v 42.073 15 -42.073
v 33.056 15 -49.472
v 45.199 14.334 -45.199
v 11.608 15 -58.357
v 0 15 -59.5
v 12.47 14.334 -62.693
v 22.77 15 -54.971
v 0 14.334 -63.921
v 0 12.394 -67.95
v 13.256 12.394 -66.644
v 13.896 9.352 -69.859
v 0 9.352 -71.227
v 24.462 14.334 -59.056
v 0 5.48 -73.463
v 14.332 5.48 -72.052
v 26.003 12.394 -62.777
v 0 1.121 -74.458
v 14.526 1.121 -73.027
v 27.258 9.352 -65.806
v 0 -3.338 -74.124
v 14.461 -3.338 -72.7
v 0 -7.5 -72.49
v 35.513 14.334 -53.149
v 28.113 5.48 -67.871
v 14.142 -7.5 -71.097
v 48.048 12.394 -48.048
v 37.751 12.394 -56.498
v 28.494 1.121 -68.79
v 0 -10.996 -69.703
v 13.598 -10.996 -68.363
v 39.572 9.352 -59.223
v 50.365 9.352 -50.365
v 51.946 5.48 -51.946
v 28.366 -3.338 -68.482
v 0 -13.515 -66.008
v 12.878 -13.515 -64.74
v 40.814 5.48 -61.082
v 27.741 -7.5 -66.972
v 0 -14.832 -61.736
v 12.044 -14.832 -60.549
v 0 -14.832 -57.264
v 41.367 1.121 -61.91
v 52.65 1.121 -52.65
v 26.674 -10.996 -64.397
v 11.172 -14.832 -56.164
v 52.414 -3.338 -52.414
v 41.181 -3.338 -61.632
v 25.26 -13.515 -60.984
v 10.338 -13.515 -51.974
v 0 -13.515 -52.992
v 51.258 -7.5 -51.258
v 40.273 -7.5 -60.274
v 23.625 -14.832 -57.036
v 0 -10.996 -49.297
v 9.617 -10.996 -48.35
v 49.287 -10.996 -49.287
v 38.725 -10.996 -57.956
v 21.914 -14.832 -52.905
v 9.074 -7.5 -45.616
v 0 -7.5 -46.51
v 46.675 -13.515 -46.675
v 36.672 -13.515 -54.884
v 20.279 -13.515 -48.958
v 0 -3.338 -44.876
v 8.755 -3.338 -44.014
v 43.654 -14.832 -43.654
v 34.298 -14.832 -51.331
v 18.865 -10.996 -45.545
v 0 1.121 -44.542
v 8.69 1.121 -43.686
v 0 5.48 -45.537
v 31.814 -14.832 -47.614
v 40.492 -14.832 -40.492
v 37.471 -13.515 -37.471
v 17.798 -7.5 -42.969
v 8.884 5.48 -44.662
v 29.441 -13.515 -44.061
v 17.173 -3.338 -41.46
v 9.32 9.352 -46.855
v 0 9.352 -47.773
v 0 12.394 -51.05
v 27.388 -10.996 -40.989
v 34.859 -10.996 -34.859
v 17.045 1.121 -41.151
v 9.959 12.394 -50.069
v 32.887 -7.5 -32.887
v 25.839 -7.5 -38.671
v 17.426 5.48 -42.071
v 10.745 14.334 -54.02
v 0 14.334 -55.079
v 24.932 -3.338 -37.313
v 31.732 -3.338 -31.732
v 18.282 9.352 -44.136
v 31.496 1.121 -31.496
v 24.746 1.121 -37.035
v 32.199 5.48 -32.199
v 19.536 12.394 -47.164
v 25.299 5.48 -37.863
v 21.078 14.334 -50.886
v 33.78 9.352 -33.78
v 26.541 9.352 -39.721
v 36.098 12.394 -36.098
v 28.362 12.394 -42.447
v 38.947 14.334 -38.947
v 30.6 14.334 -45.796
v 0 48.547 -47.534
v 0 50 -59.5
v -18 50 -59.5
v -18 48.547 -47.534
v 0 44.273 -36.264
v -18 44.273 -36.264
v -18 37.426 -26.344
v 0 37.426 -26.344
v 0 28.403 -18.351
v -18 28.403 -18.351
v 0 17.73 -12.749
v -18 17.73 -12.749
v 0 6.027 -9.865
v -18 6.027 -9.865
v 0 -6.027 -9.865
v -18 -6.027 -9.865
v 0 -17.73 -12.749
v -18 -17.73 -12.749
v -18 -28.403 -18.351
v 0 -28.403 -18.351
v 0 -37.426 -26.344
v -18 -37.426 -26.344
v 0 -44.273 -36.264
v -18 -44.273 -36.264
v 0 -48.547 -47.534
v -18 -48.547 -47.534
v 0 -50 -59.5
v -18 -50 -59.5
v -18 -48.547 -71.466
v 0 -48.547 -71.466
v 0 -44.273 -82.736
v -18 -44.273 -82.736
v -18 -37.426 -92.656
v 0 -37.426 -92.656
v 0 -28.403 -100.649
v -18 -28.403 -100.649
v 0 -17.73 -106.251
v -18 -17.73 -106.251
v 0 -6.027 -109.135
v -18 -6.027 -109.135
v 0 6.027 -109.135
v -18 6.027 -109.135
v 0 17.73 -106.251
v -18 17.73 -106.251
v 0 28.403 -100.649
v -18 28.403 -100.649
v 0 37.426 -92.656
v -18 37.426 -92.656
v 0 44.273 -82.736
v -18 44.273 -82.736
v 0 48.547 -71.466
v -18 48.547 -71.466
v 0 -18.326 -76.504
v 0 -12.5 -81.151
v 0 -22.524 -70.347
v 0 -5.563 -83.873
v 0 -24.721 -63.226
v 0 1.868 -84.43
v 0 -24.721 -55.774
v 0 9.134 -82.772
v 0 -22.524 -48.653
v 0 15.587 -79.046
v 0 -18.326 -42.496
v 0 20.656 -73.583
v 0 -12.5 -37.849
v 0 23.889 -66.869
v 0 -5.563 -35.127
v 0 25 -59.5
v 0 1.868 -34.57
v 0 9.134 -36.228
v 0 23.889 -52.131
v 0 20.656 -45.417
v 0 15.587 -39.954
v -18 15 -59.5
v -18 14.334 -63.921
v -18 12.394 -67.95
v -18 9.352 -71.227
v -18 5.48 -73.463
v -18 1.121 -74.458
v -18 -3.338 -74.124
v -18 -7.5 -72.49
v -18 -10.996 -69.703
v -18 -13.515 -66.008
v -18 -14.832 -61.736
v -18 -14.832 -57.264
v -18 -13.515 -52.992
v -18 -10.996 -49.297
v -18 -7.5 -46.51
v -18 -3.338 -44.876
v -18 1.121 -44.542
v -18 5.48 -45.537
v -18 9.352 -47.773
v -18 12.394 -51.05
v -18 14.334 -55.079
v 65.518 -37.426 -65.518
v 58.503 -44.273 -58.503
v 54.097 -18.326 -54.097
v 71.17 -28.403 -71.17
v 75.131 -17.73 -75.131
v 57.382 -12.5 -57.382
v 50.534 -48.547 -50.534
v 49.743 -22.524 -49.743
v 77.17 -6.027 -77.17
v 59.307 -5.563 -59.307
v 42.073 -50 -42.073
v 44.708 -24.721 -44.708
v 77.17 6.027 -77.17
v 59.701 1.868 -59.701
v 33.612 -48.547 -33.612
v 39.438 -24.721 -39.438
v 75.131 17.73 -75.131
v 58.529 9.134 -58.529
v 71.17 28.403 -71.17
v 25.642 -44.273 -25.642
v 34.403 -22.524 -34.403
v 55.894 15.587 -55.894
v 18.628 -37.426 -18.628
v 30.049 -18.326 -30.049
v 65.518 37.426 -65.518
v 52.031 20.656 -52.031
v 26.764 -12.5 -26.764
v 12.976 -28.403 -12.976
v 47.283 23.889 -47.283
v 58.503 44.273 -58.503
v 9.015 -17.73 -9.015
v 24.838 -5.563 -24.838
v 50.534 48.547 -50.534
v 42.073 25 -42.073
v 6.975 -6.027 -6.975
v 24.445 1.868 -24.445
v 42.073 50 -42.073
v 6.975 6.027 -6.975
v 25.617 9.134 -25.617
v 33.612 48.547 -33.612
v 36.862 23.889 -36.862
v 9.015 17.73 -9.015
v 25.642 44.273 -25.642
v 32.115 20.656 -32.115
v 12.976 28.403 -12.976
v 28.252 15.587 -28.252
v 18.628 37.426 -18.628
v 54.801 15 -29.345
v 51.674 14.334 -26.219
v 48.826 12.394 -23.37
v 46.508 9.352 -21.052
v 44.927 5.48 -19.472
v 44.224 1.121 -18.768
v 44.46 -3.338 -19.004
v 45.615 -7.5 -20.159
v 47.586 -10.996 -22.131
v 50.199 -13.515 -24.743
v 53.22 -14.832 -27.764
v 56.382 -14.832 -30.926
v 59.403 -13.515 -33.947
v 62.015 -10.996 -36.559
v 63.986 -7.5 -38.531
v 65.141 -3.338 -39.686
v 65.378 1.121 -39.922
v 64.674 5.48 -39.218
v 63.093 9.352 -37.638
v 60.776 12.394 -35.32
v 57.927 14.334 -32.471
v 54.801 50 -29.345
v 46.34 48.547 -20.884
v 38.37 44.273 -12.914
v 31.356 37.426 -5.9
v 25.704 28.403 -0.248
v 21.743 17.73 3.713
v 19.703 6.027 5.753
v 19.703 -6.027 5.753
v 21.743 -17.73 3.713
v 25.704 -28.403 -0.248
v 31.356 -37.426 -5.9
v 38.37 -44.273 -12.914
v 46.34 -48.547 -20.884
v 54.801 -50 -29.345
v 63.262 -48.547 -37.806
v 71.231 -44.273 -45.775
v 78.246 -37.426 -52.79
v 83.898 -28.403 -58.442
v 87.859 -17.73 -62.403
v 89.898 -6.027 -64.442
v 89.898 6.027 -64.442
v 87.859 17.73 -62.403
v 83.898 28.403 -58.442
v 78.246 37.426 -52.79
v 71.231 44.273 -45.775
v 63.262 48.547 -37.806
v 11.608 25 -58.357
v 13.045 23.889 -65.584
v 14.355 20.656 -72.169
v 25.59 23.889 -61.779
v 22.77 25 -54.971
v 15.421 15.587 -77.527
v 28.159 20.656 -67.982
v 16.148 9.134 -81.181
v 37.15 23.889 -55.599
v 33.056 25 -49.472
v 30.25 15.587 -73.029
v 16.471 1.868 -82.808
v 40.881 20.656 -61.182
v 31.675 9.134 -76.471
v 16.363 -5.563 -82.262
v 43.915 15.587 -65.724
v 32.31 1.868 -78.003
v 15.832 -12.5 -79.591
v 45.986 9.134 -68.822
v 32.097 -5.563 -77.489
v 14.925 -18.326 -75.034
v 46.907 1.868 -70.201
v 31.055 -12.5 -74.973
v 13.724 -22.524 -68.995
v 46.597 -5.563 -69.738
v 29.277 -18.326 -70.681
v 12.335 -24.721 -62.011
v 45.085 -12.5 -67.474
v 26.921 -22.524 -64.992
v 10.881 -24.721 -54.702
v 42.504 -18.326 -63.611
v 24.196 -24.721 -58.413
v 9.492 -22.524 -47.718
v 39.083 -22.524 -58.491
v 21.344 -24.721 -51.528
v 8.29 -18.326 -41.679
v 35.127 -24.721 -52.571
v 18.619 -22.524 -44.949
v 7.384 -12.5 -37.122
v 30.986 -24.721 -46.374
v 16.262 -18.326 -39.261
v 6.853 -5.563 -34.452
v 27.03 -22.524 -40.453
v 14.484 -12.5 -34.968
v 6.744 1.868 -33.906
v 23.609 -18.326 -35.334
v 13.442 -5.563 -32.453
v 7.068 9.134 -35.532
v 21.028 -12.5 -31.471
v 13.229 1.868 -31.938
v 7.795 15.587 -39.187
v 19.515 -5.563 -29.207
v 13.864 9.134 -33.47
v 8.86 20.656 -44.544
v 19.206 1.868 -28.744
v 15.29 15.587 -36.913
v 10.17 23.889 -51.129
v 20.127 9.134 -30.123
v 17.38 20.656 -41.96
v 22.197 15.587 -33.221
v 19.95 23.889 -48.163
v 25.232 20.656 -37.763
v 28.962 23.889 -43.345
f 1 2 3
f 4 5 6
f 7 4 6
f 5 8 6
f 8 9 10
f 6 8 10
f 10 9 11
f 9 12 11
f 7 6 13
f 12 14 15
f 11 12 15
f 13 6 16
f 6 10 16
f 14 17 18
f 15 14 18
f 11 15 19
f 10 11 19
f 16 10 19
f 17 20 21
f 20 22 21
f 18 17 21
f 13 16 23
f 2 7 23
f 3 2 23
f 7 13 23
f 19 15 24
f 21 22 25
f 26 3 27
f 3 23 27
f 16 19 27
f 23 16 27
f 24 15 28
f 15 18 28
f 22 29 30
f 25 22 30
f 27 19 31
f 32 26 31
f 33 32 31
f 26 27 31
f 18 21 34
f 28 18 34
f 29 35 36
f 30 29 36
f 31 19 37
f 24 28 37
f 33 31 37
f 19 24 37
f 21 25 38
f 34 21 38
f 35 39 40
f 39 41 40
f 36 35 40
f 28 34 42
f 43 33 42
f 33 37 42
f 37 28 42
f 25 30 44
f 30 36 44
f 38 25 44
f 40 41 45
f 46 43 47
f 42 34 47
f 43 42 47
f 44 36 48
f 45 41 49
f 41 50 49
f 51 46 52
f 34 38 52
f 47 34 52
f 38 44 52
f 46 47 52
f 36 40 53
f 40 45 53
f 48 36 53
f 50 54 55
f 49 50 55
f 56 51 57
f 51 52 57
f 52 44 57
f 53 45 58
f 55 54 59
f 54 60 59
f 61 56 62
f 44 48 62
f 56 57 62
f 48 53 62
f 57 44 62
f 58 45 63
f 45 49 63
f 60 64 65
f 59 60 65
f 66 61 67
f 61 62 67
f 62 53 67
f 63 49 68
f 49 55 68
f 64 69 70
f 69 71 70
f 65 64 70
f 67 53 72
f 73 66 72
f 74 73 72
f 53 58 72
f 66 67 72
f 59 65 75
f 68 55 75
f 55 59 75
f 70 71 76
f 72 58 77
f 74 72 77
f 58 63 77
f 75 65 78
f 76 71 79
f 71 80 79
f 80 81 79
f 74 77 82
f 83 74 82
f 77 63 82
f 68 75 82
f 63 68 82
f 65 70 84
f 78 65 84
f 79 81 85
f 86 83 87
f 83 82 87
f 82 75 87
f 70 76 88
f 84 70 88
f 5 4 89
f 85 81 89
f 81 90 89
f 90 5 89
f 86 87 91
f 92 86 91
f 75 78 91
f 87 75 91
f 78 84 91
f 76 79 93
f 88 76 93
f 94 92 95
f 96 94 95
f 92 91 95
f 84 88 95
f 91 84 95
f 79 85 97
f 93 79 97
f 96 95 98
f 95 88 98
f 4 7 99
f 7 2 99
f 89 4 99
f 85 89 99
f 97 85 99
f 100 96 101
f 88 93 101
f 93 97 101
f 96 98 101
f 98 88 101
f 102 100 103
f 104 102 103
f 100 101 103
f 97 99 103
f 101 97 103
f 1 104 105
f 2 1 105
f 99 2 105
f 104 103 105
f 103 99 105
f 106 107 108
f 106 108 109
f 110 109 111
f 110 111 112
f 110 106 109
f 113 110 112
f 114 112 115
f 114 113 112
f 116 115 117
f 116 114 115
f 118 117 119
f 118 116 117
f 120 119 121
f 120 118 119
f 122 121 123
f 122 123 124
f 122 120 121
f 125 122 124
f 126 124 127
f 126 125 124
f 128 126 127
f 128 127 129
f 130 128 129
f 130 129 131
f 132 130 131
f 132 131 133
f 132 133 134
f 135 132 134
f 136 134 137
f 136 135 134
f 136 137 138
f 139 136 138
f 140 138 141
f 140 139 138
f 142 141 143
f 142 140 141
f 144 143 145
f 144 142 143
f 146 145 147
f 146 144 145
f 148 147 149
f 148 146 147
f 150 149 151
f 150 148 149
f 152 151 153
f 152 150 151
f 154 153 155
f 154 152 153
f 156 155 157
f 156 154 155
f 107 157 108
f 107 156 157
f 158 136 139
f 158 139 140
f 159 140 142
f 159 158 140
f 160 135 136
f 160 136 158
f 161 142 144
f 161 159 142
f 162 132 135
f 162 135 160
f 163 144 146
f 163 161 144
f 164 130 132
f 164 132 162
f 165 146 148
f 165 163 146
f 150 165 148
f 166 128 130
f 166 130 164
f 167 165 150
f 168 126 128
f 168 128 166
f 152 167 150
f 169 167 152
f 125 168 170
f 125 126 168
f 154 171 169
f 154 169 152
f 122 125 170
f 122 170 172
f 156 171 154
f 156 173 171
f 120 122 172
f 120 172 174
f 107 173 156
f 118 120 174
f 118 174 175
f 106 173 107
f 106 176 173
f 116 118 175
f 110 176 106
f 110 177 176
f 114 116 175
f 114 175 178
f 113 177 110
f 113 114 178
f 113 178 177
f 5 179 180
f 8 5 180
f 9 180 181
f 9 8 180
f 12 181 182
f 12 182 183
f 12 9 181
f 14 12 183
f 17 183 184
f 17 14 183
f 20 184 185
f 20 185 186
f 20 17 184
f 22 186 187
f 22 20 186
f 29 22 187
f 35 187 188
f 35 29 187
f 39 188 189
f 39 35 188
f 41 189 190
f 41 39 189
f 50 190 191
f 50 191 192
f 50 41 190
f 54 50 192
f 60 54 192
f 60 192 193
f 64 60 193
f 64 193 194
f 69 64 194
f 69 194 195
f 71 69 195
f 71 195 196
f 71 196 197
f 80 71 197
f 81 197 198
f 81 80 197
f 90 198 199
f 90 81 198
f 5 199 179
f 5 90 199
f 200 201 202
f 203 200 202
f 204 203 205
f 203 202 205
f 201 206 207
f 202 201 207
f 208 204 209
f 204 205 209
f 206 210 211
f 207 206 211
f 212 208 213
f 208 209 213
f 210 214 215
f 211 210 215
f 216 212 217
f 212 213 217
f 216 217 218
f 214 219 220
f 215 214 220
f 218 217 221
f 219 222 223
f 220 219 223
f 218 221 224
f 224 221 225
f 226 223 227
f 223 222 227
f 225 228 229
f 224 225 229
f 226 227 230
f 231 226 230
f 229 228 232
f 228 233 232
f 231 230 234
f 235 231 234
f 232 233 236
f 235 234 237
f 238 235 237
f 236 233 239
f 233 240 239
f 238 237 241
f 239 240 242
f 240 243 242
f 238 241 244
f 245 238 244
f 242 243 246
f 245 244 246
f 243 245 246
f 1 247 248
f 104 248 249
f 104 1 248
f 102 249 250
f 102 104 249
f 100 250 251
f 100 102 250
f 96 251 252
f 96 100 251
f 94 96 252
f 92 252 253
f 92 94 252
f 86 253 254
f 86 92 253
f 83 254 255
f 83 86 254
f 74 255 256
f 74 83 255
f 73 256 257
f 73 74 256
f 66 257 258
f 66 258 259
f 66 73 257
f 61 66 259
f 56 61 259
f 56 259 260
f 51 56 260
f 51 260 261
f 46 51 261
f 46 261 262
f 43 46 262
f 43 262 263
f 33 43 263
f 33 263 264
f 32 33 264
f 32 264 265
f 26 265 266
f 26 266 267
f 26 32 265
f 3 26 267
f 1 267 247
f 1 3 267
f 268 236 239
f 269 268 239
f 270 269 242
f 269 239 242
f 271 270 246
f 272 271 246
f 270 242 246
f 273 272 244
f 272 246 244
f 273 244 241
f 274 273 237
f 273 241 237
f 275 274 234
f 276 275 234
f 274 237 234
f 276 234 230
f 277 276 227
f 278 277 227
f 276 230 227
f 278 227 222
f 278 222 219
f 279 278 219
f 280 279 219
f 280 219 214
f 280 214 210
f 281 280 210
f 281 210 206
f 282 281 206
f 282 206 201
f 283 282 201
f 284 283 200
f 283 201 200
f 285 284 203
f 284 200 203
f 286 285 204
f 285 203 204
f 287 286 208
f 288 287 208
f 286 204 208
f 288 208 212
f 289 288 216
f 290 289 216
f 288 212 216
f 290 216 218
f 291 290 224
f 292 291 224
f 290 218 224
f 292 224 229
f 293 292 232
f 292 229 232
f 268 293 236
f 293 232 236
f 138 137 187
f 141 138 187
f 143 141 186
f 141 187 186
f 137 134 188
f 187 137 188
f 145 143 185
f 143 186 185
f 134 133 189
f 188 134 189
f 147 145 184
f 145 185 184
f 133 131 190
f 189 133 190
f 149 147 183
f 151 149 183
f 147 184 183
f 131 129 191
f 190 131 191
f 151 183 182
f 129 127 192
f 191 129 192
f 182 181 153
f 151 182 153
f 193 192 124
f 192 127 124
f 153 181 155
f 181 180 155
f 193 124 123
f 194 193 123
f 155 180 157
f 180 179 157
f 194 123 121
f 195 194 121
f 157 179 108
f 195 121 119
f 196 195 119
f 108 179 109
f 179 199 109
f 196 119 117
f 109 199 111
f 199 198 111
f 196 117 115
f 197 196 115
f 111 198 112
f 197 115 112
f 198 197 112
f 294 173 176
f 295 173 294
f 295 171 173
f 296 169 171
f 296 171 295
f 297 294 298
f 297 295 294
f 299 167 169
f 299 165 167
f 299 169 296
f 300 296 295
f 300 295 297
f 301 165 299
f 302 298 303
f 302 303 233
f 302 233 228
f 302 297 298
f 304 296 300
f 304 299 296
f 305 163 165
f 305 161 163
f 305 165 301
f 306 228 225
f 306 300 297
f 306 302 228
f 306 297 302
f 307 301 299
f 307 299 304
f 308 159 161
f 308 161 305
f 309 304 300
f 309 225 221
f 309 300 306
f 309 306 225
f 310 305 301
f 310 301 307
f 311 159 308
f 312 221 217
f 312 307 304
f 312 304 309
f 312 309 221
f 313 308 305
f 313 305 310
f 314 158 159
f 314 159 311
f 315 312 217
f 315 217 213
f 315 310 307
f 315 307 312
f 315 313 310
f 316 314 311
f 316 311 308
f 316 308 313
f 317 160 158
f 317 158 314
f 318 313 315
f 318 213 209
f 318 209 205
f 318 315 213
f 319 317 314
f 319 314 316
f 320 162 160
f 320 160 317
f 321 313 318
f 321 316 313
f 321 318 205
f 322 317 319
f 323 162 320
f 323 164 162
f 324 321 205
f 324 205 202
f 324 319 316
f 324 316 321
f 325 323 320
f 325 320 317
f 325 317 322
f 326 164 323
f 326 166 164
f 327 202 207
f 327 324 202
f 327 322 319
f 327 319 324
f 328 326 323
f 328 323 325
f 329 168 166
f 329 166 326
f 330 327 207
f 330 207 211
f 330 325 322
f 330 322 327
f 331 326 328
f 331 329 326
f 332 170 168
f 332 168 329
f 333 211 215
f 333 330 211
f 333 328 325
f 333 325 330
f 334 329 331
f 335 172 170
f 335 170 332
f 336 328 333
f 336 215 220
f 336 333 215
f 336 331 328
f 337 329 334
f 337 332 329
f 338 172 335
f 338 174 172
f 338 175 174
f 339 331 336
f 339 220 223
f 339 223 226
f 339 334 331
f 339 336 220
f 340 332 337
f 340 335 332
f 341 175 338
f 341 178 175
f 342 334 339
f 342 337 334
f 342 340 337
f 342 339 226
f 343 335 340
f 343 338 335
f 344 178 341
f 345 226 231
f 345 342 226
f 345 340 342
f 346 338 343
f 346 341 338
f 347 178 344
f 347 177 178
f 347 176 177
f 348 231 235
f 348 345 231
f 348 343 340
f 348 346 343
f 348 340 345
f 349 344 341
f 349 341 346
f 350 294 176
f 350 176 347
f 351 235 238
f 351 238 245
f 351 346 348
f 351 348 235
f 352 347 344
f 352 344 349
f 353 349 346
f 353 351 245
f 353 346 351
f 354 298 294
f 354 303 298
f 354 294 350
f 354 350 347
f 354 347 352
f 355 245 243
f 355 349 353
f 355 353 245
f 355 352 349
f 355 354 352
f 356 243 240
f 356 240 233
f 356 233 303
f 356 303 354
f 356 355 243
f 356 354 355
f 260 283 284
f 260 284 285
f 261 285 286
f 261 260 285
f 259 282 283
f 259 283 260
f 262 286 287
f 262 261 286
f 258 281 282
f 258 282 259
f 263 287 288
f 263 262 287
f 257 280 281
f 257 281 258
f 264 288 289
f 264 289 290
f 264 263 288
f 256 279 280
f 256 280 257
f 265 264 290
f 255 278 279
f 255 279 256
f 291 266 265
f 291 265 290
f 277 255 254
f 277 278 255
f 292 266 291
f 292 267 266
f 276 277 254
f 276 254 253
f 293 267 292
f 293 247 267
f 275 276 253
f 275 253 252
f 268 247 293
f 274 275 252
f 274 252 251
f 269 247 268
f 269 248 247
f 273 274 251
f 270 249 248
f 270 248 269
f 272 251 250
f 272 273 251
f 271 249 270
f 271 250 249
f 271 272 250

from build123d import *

# Parameters (mm, degrees)
F1_R     = 50
F1_R_2   = 25
F2_DEPTH = 18
F4_R     = 50
F4_R_2   = 25
F4_R_3   = 15
F5_DEPTH = 18


with BuildPart() as f2:
    # F1 (on Right) → F2 (new body)
    with BuildSketch(Plane.YZ):
        with Locations((0, -59.5)):
            Circle(F1_R)
        with Locations((0, -59.5)):
            Circle(F1_R_2, mode=Mode.SUBTRACT)
        with Locations((0, -59.5)):
            Circle(F1_R_2)
        with BuildLine():
            ThreePointArc((0, -44.5), (10.6066017178, -48.8933982822), (15, -59.5))
            ThreePointArc((15, -59.5), (-10.6066017178, -70.1066017178), (0, -44.5))
        make_face(mode=Mode.SUBTRACT)
    extrude(amount=-F2_DEPTH)

    # F3: sweep along a path in F0
    with BuildLine(Plane.XZ) as f3_path:
        ThreePointArc((0, -59.5), (22.7696642257, -54.9708321844), (42.0728534806, -42.0728534806))
    # F1 (on Right) → F3 (sweep)
    with BuildSketch(Plane.YZ):
        with Locations((0, -59.5)):
            Circle(F1_R_2)
        with BuildLine():
            ThreePointArc((0, -44.5), (10.6066017178, -48.8933982822), (15, -59.5))
            ThreePointArc((15, -59.5), (-10.6066017178, -70.1066017178), (0, -44.5))
        make_face(mode=Mode.SUBTRACT)
    sweep(path=f3_path.line)

    # F4 (on face) → F5 (join)
    with BuildSketch(Plane(origin=(0, 0, 0), x_dir=(0, 1, 0), z_dir=(0.7071067812, 0, 0.7071067812))):
        with Locations((0, -59.5)):
            Circle(F4_R)
        with Locations((0, -59.5)):
            Circle(F4_R_2, mode=Mode.SUBTRACT)
        with Locations((0, -59.5)):
            Circle(F4_R_2)
        with Locations((0, -59.5)):
            Circle(F4_R_3, mode=Mode.SUBTRACT)
    extrude(amount=F5_DEPTH)


solid = f2.part
